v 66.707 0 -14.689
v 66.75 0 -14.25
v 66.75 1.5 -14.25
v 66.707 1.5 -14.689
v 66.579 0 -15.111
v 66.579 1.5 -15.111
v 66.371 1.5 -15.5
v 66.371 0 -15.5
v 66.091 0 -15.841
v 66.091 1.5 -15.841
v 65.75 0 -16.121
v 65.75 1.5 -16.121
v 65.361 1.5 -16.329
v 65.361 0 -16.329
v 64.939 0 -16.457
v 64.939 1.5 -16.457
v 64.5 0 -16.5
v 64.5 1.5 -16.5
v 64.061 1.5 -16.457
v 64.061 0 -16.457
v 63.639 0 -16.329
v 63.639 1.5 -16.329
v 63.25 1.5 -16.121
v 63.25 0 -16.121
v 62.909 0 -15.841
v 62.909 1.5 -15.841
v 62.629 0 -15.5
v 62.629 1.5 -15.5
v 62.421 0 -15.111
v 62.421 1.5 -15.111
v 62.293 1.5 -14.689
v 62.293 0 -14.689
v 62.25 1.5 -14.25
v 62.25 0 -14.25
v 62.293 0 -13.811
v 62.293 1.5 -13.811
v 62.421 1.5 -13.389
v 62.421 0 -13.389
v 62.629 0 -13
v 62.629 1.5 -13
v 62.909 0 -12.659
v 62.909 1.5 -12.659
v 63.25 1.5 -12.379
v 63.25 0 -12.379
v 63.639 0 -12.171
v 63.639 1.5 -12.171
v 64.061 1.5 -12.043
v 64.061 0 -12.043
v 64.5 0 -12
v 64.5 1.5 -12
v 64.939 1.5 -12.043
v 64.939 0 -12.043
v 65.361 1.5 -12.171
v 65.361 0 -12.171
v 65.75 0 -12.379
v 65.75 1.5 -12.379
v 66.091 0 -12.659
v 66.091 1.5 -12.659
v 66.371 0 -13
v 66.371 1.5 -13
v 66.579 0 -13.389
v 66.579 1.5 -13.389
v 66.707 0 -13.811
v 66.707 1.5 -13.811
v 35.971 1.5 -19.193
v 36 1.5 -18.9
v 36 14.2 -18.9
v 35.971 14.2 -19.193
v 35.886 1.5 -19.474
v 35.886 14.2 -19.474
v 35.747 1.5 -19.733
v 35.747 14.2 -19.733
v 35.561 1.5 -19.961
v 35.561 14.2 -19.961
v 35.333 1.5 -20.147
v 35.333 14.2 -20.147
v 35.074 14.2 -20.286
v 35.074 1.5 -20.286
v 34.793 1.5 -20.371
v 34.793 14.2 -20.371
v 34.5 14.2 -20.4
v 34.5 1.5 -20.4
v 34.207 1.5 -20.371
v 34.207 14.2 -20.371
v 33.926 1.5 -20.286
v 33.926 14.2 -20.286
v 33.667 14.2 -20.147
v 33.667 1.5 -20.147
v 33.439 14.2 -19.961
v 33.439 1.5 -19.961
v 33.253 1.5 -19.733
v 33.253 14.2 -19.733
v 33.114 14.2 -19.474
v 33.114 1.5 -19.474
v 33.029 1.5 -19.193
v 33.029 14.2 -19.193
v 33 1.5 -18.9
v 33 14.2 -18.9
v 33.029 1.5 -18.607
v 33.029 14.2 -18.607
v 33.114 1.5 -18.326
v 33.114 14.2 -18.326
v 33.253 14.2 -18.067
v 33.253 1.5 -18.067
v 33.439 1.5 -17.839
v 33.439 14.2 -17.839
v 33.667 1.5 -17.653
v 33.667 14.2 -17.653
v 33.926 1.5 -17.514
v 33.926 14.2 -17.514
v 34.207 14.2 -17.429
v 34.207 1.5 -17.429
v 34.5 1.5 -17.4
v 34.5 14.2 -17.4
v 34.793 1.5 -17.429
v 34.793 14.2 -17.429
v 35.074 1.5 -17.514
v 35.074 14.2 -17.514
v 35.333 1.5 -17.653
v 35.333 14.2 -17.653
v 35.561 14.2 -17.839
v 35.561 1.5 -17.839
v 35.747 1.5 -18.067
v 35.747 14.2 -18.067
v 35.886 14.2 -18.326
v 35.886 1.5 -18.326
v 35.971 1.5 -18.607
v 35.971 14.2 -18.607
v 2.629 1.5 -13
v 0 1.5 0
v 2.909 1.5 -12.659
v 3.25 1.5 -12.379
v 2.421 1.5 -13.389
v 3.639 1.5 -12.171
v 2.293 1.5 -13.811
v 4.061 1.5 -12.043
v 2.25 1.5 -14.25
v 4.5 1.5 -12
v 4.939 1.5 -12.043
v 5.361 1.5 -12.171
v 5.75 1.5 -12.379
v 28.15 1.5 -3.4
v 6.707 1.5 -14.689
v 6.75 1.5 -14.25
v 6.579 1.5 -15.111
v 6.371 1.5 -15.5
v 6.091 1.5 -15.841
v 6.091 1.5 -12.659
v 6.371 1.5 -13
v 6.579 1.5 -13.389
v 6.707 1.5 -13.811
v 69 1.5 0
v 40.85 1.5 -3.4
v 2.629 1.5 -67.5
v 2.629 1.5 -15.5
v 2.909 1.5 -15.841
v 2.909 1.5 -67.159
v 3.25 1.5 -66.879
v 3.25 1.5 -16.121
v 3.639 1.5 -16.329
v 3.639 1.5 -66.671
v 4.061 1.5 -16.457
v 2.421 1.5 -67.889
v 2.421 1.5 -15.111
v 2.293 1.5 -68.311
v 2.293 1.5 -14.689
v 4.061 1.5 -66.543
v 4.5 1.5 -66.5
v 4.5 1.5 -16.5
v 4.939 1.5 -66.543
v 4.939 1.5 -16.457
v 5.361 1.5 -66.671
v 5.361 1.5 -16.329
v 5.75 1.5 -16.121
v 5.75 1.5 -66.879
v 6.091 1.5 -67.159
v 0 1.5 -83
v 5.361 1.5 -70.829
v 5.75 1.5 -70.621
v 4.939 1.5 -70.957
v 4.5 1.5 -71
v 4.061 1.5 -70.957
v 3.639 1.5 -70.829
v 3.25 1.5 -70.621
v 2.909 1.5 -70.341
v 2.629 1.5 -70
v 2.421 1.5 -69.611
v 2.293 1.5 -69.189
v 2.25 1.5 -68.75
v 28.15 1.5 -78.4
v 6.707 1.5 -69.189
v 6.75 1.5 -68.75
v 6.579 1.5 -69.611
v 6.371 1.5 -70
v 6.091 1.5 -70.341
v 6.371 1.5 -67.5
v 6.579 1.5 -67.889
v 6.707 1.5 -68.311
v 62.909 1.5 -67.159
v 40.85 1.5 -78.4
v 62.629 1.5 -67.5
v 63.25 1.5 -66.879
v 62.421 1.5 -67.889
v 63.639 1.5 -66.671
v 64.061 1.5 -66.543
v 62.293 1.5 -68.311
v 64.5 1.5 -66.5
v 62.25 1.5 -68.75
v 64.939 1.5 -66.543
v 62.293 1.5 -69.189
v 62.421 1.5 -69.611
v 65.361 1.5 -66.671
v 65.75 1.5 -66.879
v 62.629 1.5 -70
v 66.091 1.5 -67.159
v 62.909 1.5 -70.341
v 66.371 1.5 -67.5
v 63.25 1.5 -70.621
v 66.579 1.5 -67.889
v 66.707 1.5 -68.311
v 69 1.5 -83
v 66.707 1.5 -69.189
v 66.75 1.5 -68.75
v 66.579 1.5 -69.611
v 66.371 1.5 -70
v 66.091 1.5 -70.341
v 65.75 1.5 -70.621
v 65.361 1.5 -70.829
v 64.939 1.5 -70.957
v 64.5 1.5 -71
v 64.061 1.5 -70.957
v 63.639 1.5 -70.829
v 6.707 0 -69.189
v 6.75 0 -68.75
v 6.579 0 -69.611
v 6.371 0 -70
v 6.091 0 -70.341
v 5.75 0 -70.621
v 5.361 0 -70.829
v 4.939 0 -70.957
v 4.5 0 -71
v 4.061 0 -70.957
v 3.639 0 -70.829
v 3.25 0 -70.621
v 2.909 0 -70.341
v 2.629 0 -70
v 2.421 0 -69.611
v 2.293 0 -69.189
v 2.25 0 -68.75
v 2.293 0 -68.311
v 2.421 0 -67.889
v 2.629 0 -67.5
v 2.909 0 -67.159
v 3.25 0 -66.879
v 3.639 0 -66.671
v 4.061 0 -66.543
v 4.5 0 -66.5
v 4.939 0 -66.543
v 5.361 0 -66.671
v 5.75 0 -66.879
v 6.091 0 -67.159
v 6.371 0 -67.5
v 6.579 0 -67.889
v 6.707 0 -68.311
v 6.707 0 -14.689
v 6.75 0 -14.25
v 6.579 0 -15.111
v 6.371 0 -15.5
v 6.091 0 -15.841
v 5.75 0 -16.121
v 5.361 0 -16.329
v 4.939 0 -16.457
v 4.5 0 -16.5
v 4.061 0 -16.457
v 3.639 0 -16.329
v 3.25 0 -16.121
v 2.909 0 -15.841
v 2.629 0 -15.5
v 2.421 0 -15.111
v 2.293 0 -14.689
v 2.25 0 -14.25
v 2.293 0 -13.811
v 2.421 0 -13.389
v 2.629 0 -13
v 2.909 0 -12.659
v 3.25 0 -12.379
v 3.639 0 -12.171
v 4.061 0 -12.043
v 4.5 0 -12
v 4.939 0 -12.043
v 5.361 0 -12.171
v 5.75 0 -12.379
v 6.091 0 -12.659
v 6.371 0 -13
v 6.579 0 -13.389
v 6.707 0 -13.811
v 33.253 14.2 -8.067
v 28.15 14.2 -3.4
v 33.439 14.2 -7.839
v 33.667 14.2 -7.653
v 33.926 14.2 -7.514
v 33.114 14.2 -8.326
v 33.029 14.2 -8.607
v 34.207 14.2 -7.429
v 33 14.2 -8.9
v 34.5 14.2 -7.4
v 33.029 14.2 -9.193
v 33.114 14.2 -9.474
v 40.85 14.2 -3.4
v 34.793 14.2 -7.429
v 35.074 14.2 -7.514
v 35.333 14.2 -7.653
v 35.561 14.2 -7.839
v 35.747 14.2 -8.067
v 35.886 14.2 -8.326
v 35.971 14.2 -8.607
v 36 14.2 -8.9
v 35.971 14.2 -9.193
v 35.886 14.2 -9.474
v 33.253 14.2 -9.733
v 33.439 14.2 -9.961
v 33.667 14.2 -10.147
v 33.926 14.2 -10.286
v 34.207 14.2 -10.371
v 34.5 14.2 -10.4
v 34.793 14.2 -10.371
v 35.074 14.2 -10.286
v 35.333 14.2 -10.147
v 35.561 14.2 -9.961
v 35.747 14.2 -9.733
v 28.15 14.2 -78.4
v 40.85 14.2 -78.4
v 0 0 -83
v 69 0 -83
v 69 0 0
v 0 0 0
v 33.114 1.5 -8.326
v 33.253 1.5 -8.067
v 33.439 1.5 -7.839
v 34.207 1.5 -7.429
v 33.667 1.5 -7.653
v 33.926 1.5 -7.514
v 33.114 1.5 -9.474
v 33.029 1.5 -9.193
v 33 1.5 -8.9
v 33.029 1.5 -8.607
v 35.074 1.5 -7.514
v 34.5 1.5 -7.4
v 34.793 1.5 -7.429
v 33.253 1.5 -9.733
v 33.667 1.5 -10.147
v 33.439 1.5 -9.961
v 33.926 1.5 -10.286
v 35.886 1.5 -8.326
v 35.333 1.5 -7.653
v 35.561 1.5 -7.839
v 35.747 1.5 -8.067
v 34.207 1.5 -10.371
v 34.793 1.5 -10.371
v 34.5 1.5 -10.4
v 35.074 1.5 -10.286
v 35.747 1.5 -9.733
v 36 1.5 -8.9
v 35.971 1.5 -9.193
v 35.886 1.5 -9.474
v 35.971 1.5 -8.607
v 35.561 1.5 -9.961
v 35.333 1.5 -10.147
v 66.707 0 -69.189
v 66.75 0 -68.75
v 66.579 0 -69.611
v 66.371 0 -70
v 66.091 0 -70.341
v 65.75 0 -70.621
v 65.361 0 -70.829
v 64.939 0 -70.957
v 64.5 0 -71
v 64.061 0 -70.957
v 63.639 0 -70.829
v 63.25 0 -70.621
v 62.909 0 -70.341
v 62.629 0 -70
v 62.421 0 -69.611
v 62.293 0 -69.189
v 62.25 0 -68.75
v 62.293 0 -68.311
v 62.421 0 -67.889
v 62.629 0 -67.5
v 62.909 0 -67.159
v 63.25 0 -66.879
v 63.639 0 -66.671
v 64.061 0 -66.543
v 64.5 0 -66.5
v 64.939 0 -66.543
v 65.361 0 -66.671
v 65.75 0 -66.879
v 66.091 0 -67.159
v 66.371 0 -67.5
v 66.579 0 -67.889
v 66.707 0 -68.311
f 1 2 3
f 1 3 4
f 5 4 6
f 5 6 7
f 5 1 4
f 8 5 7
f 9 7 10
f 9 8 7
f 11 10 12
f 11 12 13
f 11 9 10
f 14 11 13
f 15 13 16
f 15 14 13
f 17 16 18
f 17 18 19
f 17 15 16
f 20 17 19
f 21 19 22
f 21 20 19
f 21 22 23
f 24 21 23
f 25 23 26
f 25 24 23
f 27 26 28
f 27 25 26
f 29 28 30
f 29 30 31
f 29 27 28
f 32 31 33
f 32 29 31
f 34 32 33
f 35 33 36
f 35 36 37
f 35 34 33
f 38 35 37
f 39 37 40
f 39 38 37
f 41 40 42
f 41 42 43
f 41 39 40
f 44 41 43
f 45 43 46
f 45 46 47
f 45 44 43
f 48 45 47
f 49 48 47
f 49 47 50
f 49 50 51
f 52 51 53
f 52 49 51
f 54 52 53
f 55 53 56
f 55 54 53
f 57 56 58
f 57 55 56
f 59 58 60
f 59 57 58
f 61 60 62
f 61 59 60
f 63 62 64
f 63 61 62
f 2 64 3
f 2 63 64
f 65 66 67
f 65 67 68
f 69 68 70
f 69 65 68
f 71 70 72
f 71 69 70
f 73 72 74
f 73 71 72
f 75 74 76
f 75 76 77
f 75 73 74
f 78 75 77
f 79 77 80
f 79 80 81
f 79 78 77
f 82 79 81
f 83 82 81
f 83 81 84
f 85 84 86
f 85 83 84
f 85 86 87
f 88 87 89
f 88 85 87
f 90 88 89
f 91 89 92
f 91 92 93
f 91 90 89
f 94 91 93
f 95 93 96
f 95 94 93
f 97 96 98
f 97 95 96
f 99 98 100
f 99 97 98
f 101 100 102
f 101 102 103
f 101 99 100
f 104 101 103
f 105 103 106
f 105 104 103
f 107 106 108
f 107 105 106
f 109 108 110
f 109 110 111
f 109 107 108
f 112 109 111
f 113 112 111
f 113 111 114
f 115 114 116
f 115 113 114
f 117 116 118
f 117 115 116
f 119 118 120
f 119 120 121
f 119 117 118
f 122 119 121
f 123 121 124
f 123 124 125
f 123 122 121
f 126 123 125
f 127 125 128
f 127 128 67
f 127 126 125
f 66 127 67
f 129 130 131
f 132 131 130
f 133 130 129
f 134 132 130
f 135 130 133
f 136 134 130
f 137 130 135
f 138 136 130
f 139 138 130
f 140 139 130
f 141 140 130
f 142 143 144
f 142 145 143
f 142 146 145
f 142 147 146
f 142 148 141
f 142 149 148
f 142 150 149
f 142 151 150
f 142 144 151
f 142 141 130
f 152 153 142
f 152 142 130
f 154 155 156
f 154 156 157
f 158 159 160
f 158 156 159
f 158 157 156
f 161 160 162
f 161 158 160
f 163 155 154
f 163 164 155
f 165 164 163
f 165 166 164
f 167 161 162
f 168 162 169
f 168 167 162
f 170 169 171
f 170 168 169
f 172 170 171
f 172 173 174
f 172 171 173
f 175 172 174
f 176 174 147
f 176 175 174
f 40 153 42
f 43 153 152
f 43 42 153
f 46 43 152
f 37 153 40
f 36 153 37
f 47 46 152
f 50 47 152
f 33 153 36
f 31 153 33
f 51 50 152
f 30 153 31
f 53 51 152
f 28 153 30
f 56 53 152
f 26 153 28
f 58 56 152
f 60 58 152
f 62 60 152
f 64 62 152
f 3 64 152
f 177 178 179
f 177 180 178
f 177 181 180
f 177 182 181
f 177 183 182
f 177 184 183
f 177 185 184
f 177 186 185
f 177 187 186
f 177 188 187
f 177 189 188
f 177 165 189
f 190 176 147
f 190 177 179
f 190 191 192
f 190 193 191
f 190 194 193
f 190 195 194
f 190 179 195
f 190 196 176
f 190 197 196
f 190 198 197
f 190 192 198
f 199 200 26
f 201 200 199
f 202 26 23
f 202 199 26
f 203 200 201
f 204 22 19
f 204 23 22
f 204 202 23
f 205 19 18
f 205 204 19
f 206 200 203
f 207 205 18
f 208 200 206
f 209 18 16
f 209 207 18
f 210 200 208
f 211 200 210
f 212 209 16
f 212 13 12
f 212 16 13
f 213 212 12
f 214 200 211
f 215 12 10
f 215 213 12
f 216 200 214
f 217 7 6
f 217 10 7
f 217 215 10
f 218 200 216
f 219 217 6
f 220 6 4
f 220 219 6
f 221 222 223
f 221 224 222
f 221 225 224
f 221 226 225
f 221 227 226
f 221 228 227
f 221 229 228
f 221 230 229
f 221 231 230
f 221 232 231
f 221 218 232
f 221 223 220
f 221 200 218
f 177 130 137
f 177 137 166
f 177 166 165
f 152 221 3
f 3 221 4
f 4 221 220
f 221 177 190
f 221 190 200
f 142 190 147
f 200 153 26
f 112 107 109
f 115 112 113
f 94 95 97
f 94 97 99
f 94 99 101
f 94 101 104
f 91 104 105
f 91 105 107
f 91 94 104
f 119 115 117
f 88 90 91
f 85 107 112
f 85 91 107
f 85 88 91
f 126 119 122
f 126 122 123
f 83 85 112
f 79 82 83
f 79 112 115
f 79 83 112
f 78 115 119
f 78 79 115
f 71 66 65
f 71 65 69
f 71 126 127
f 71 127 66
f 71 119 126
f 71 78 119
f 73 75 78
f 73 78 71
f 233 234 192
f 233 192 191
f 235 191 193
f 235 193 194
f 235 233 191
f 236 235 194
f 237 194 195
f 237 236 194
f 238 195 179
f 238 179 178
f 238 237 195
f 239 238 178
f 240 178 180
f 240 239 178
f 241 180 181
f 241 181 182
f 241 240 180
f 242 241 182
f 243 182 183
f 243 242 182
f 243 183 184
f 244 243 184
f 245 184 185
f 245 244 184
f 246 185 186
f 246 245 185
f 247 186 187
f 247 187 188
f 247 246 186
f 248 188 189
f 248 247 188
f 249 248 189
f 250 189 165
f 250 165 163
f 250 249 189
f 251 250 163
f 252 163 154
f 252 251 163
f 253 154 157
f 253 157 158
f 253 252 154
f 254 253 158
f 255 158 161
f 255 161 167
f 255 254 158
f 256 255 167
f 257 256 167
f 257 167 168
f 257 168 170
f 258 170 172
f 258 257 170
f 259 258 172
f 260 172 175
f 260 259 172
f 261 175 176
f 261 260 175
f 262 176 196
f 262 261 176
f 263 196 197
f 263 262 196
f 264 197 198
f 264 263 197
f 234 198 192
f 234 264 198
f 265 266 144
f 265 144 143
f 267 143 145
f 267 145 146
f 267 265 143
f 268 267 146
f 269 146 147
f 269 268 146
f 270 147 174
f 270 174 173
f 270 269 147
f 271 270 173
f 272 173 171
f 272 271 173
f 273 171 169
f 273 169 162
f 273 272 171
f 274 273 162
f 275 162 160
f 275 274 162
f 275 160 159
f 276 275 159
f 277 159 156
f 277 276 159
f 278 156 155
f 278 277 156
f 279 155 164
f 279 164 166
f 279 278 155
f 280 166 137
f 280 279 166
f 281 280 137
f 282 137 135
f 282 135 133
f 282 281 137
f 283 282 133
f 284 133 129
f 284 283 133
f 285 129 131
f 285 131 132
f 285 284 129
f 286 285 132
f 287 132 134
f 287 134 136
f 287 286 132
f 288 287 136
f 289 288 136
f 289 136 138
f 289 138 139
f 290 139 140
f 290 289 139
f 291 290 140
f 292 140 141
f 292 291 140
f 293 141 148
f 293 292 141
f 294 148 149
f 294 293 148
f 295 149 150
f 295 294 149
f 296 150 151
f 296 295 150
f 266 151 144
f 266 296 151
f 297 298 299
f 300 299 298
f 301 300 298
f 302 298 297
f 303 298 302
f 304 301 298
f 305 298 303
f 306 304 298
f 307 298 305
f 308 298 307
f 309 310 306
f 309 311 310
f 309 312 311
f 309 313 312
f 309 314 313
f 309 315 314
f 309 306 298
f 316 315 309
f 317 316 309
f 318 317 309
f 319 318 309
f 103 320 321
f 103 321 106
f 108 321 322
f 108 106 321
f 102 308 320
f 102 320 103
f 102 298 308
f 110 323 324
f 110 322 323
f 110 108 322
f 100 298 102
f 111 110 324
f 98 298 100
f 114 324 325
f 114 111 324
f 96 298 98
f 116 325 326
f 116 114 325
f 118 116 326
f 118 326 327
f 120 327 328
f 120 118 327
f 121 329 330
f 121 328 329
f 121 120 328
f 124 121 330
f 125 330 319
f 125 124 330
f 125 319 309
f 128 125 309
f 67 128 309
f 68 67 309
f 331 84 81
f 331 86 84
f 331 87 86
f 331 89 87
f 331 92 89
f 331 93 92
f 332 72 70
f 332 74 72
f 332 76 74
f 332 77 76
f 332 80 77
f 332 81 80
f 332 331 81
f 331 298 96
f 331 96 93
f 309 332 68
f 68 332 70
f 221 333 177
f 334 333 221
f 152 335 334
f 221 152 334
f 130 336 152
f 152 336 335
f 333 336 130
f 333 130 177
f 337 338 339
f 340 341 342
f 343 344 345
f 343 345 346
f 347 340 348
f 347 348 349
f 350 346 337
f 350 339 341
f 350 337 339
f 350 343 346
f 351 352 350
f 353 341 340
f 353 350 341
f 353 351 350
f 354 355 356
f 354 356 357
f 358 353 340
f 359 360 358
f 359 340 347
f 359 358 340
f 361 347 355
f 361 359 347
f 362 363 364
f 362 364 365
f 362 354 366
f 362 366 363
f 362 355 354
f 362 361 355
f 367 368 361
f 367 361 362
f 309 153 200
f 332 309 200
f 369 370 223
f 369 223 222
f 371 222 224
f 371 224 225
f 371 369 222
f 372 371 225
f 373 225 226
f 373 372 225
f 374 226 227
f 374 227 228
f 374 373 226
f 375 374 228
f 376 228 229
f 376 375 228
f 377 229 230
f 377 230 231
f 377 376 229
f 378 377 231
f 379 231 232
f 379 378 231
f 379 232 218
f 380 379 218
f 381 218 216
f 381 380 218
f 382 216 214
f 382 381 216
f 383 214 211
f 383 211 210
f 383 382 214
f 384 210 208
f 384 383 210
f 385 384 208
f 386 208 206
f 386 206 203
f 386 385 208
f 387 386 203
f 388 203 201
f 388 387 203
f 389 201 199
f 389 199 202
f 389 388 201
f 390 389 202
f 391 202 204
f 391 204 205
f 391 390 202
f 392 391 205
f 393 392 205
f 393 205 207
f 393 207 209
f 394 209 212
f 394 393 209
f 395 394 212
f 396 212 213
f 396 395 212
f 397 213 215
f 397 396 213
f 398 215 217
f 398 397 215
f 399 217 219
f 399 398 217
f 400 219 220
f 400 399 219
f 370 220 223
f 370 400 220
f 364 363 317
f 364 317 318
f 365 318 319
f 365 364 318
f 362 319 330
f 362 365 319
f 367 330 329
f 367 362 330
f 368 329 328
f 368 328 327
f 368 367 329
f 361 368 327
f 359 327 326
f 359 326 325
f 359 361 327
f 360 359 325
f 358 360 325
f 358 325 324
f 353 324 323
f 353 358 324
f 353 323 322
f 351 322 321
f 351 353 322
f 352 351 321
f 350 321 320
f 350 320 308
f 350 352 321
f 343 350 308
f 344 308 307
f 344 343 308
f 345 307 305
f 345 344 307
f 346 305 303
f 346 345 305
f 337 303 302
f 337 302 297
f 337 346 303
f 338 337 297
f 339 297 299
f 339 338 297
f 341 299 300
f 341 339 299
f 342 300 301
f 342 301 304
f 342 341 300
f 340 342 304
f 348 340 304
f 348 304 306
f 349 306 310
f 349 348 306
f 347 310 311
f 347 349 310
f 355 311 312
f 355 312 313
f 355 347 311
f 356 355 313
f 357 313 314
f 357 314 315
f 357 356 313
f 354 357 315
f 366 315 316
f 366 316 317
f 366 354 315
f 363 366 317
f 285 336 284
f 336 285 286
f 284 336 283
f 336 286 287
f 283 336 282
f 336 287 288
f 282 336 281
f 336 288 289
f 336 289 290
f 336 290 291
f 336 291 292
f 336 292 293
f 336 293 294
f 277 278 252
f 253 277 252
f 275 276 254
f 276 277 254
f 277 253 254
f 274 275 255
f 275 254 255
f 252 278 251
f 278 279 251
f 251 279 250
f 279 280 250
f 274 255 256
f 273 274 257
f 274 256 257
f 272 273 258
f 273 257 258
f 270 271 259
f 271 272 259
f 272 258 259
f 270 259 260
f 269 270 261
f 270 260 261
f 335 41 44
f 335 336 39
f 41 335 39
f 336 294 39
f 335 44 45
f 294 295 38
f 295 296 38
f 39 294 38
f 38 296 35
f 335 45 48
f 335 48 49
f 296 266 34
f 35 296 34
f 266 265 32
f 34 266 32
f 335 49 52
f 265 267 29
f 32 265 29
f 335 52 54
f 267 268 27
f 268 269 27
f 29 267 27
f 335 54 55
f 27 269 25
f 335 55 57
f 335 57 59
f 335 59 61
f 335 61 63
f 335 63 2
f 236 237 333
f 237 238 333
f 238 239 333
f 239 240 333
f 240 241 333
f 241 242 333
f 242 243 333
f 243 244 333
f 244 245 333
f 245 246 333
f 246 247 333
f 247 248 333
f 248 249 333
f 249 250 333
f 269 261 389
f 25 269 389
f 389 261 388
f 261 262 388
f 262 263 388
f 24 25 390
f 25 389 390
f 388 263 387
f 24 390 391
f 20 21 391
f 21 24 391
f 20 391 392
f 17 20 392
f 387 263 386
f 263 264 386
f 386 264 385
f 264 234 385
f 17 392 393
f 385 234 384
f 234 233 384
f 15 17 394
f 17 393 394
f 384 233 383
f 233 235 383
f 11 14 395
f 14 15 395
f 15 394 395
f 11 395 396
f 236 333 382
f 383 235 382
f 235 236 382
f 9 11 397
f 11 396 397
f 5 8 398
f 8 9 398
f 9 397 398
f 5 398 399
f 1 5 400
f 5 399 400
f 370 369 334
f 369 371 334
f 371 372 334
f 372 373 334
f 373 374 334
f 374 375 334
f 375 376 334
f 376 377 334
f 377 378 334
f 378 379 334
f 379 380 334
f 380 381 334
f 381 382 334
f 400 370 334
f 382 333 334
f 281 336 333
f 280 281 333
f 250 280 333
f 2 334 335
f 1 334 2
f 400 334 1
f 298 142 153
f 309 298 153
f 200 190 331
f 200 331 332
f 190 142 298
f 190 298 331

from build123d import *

# Parameters (mm, degrees)
SKETCH1_W           = 69
SKETCH1_H           = 83
SKETCH1_R           = 2.25
BOSS_EXTRUDE1_DEPTH = 1.5
SKETCH2_W           = 12.7
SKETCH2_H           = 75
SKETCH2_R           = 1.5
BOSS_EXTRUDE2_DEPTH = 12.7


with BuildPart() as part:
    # Sketch1 → Boss-Extrude1 (new body)
    with BuildSketch(Plane(origin=(0, 0, 0), x_dir=(1, 0, 0), z_dir=(0, 1, 0))):
        with Locations((34.5, 41.5)):
            Rectangle(SKETCH1_W, SKETCH1_H)
        with Locations((4.5, 68.75)):
            Circle(SKETCH1_R, mode=Mode.SUBTRACT)
        with Locations((64.5, 68.75)):
            Circle(SKETCH1_R, mode=Mode.SUBTRACT)
        with Locations((64.5, 14.25)):
            Circle(SKETCH1_R, mode=Mode.SUBTRACT)
        with Locations((4.5, 14.25)):
            Circle(SKETCH1_R, mode=Mode.SUBTRACT)
    extrude(amount=BOSS_EXTRUDE1_DEPTH)

    # Sketch2 → Boss-Extrude2 (add)
    with BuildSketch(Plane(origin=(0, 1.5, 0), x_dir=(1, 0, 0), z_dir=(0, 1, 0))):
        with Locations((34.5, 40.9)):
            Rectangle(SKETCH2_W, SKETCH2_H)
        with Locations((34.5, 8.9)):
            Circle(SKETCH2_R, mode=Mode.SUBTRACT)
        with Locations((34.5, 18.9)):
            Circle(SKETCH2_R, mode=Mode.SUBTRACT)
    extrude(amount=BOSS_EXTRUDE2_DEPTH)


solid = part.part
